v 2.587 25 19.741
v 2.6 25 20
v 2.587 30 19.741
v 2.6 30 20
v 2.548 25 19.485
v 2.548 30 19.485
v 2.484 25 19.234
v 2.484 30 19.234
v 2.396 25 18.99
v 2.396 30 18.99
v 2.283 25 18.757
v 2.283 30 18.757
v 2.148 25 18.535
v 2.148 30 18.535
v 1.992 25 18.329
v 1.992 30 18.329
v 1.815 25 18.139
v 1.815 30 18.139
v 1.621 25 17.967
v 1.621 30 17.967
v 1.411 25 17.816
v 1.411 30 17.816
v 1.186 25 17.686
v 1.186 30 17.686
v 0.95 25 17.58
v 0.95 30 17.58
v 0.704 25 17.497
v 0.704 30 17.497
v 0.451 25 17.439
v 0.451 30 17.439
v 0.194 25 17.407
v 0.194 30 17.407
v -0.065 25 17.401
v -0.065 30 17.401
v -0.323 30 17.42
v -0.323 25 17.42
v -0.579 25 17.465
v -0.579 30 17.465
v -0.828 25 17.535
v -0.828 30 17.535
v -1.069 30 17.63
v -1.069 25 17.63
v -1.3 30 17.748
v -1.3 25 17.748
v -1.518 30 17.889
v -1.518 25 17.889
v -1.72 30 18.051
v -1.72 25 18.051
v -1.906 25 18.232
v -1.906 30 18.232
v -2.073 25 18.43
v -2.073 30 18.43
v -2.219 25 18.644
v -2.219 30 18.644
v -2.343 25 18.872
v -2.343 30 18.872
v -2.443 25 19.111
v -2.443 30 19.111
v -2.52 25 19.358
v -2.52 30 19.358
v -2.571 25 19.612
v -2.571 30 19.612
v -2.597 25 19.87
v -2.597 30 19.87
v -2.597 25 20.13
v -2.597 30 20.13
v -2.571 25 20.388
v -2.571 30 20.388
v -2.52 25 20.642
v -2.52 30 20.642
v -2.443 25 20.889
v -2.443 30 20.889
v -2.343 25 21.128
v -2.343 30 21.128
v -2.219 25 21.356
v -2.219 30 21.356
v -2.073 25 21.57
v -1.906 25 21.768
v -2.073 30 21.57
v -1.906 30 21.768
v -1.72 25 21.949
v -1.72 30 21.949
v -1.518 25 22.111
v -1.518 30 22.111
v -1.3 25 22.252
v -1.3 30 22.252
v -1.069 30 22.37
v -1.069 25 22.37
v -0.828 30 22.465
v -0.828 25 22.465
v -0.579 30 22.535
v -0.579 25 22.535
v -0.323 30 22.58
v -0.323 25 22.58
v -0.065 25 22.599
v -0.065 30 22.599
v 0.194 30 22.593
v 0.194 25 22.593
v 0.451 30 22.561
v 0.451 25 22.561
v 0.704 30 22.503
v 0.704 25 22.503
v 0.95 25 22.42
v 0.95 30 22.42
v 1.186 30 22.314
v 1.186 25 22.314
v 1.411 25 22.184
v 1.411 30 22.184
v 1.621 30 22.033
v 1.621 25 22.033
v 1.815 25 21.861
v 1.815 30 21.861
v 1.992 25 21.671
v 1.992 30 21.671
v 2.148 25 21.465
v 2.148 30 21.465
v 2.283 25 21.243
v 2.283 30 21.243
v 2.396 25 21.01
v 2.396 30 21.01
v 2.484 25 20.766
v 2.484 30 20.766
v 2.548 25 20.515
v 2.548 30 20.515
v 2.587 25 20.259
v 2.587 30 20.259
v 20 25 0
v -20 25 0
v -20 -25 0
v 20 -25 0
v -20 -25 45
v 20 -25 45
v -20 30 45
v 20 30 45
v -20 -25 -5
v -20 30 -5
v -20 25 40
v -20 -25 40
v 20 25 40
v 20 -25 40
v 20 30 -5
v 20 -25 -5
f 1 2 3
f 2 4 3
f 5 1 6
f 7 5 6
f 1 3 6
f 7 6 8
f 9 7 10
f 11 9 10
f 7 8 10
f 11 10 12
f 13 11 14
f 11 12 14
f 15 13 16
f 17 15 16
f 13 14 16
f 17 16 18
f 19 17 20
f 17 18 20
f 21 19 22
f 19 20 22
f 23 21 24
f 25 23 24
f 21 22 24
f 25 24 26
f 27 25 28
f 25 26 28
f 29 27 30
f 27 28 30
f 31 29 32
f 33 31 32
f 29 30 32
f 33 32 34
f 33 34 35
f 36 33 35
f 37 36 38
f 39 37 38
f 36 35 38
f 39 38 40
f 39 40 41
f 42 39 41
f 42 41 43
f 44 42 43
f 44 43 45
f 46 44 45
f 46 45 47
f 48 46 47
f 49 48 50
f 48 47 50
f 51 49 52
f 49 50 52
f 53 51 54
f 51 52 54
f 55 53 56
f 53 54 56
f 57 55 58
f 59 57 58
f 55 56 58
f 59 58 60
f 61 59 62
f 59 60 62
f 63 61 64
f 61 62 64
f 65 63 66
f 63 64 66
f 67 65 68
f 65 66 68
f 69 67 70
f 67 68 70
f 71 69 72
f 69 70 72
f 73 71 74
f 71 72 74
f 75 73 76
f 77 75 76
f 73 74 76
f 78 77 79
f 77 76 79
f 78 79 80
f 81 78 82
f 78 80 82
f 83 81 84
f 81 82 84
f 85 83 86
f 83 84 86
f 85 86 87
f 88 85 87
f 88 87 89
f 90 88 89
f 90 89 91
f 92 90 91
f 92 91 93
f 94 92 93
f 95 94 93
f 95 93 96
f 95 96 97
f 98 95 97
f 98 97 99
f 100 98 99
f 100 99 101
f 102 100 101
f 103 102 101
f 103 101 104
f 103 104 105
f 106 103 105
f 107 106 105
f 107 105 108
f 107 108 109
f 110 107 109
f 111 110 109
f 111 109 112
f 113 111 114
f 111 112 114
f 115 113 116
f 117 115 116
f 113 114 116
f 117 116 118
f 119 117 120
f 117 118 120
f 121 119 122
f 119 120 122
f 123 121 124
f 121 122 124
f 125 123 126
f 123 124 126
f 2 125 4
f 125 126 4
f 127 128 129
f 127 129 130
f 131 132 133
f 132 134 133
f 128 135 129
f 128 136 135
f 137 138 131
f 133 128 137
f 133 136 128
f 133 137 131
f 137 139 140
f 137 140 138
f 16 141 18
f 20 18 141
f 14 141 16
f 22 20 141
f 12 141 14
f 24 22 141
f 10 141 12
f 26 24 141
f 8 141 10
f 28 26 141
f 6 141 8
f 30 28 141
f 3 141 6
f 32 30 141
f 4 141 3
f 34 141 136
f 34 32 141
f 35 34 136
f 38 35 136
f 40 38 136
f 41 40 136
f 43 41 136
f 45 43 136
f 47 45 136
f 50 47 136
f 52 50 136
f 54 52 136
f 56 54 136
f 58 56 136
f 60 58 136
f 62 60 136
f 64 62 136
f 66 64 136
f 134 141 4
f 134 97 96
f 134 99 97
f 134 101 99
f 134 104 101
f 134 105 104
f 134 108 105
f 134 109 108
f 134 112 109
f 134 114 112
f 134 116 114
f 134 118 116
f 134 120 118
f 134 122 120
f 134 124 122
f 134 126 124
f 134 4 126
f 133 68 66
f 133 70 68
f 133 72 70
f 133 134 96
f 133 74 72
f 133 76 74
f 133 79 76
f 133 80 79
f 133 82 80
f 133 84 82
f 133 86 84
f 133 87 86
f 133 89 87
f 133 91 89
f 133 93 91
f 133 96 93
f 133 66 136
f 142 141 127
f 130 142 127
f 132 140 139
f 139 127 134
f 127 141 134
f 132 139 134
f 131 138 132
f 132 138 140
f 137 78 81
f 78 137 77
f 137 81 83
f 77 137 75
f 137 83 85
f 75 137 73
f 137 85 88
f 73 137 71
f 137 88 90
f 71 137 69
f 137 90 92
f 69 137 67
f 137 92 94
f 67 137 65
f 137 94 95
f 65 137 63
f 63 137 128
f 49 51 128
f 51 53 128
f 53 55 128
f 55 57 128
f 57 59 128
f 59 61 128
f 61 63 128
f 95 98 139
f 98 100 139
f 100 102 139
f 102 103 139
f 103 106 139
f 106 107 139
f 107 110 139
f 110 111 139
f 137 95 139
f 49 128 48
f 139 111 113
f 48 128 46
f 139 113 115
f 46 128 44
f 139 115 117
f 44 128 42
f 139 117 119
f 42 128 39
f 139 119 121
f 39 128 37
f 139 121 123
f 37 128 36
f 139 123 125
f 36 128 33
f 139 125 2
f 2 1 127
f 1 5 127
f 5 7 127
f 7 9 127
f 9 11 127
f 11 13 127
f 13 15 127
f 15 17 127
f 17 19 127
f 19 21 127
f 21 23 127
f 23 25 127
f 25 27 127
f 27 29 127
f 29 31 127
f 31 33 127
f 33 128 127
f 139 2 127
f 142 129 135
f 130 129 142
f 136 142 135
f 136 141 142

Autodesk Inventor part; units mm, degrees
ref_plane "YZ Plane" through (0, 0, 0) normal (1, 0, 0) x (0, 1, 0)
ref_plane "XZ Plane" through (0, 0, 0) normal (0, 1, 0) x (-1, 0, 0)
sketch "Sketch1" plane through (0, 0, 0) normal (0, 0, 1) x (1, 0, 0)
  line L0 (-10, -25) -> (10, -25)
  line L1 (10, -25) -> (10, 25)
  line L2 (10, 25) -> (-10, 25)
  line L3 (-10, 25) -> (-10, -25)
  line L4 (-10, -25) -> (10, 25) construction
  line L5 (10, -25) -> (-10, 25) construction
  point P0 (0, 0)
  dimension "d0" = 20
  dimension "d1" = 50
ref_plane "Work Plane1" through (-10, 25, 0) normal (0, 1, 0) x (1, 0, 0)
sketch "Sketch2" plane through (-10, 25, 0) normal (0, 1, 0) x (1, 0, 0)
  line L0 (20, 0) -> (0, 0) projected
  line L1 (0, 0) -> (20, 0)
  line L2 (20, 0) -> (20, -40)
  line L3 (20, -40) -> (0, -40)
  line L4 (0, -40) -> (0, 0)
  point P0 (10, 0)
  dimension "d4" = 40
extrude "Extrusion2" add sketch "Sketch2" along normal blind 5
sketch "Sketch3" plane through (-10, 25, 40) normal (0, 0, 1) x (1, 0, 0)
  line L0 (20, -50) -> (20, 0) projected
  line L1 (20, 0) -> (0, 0) projected
  line L2 (0, 0) -> (0, -50) projected
  line L3 (0, -50) -> (20, -50) projected
  line L4 (0, 0) -> (20, 0) projected
  line L5 (20, 0) -> (20, 5) projected
  line L6 (0, 5) -> (20, 5) projected
  line L7 (0, 0) -> (0, 5) projected
  point P0 (10, -25)
extrude "Extrusion3" add sketch "Sketch3" along normal blind 5
extrude "Extrusion4" add sketch "Sketch1" against normal blind 5
sketch "Sketch4" plane through (10, 30, 0) normal (0, 0, -1) x (-1, 0, 0)
  line L0 (0, -5) -> (20, -5) projected
  line L1 (20, -5) -> (20, 0) projected
  line L2 (0, 0) -> (20, 0) projected
  line L3 (0, -5) -> (0, 0) projected
  point P0 (10, -30)
extrude "Extrusion5" add sketch "Sketch4" along normal blind 5
sketch "Sketch5" plane through (-10, 30, 0) normal (0, 1, 0) x (1, 0, 0)
  circle A0 centre (10, -20) radius 2.6
  point P0 (10, 0)
  dimension "d13" = 5.2
extrude "Extrusion6" cut sketch "Sketch5" against normal blind 10
sketch "Sketch6" plane through (-10, 30, 0) normal (0, 1, 0) x (1, 0, 0)
  line L0 (20, 0) -> (20, 5) projected
  line L1 (20, 5) -> (30, 5)
  line L2 (30, 5) -> (30, -45)
  line L3 (30, -45) -> (20, -45)
  line L4 (20, -45) -> (20, 5)
  line L5 (20, 5) -> (0, 5) projected
  line L6 (0, 5) -> (-10, 5)
  line L7 (-10, 5) -> (-10, -45)
  line L8 (-10, -45) -> (0, -45)
  line L9 (0, -45) -> (0, 5)
  point P0 (10, 0)
  dimension "d16" = 10
  dimension "d17" = 50
  dimension "d18" = 10
extrude "Extrusion7" add sketch "Sketch6" against normal blind 5
sketch "Sketch7" plane through (-10, 25, 0) normal (0, -1, 0) x (1, 0, 0)
  line L0 (20, -5) -> (30, -5) projected
  line L1 (30, -5) -> (20, -5)
  line L2 (20, -5) -> (20, 0)
  line L3 (20, 0) -> (30, 0)
  line L4 (30, 0) -> (30, -5)
  line L5 (30, -5) -> (-10, -5) projected
  line L6 (0, 0) -> (0, -5) projected
  line L7 (-10, -5) -> (0, -5)
  line L8 (0, -5) -> (0, 0)
  line L9 (0, 0) -> (-10, 0)
  line L10 (-10, 0) -> (-10, -5)
  line L11 (-10, 45) -> (30, 45) projected
  line L12 (30, -5) -> (30, 45) projected
  line L13 (20, 45) -> (30, 45)
  line L14 (30, 45) -> (30, 40)
  line L15 (30, 40) -> (20, 40)
  line L16 (20, 40) -> (20, 45)
  line L17 (-10, 45) -> (0, 45)
  line L18 (0, 45) -> (0, 40)
  line L19 (0, 40) -> (-10, 40)
  line L20 (-10, 40) -> (-10, 45)
  point P0 (10, 0)
  dimension "d21" = 5
extrude "Extrusion8" add sketch "Sketch7" along normal blind 50
properties part number "brazo"
